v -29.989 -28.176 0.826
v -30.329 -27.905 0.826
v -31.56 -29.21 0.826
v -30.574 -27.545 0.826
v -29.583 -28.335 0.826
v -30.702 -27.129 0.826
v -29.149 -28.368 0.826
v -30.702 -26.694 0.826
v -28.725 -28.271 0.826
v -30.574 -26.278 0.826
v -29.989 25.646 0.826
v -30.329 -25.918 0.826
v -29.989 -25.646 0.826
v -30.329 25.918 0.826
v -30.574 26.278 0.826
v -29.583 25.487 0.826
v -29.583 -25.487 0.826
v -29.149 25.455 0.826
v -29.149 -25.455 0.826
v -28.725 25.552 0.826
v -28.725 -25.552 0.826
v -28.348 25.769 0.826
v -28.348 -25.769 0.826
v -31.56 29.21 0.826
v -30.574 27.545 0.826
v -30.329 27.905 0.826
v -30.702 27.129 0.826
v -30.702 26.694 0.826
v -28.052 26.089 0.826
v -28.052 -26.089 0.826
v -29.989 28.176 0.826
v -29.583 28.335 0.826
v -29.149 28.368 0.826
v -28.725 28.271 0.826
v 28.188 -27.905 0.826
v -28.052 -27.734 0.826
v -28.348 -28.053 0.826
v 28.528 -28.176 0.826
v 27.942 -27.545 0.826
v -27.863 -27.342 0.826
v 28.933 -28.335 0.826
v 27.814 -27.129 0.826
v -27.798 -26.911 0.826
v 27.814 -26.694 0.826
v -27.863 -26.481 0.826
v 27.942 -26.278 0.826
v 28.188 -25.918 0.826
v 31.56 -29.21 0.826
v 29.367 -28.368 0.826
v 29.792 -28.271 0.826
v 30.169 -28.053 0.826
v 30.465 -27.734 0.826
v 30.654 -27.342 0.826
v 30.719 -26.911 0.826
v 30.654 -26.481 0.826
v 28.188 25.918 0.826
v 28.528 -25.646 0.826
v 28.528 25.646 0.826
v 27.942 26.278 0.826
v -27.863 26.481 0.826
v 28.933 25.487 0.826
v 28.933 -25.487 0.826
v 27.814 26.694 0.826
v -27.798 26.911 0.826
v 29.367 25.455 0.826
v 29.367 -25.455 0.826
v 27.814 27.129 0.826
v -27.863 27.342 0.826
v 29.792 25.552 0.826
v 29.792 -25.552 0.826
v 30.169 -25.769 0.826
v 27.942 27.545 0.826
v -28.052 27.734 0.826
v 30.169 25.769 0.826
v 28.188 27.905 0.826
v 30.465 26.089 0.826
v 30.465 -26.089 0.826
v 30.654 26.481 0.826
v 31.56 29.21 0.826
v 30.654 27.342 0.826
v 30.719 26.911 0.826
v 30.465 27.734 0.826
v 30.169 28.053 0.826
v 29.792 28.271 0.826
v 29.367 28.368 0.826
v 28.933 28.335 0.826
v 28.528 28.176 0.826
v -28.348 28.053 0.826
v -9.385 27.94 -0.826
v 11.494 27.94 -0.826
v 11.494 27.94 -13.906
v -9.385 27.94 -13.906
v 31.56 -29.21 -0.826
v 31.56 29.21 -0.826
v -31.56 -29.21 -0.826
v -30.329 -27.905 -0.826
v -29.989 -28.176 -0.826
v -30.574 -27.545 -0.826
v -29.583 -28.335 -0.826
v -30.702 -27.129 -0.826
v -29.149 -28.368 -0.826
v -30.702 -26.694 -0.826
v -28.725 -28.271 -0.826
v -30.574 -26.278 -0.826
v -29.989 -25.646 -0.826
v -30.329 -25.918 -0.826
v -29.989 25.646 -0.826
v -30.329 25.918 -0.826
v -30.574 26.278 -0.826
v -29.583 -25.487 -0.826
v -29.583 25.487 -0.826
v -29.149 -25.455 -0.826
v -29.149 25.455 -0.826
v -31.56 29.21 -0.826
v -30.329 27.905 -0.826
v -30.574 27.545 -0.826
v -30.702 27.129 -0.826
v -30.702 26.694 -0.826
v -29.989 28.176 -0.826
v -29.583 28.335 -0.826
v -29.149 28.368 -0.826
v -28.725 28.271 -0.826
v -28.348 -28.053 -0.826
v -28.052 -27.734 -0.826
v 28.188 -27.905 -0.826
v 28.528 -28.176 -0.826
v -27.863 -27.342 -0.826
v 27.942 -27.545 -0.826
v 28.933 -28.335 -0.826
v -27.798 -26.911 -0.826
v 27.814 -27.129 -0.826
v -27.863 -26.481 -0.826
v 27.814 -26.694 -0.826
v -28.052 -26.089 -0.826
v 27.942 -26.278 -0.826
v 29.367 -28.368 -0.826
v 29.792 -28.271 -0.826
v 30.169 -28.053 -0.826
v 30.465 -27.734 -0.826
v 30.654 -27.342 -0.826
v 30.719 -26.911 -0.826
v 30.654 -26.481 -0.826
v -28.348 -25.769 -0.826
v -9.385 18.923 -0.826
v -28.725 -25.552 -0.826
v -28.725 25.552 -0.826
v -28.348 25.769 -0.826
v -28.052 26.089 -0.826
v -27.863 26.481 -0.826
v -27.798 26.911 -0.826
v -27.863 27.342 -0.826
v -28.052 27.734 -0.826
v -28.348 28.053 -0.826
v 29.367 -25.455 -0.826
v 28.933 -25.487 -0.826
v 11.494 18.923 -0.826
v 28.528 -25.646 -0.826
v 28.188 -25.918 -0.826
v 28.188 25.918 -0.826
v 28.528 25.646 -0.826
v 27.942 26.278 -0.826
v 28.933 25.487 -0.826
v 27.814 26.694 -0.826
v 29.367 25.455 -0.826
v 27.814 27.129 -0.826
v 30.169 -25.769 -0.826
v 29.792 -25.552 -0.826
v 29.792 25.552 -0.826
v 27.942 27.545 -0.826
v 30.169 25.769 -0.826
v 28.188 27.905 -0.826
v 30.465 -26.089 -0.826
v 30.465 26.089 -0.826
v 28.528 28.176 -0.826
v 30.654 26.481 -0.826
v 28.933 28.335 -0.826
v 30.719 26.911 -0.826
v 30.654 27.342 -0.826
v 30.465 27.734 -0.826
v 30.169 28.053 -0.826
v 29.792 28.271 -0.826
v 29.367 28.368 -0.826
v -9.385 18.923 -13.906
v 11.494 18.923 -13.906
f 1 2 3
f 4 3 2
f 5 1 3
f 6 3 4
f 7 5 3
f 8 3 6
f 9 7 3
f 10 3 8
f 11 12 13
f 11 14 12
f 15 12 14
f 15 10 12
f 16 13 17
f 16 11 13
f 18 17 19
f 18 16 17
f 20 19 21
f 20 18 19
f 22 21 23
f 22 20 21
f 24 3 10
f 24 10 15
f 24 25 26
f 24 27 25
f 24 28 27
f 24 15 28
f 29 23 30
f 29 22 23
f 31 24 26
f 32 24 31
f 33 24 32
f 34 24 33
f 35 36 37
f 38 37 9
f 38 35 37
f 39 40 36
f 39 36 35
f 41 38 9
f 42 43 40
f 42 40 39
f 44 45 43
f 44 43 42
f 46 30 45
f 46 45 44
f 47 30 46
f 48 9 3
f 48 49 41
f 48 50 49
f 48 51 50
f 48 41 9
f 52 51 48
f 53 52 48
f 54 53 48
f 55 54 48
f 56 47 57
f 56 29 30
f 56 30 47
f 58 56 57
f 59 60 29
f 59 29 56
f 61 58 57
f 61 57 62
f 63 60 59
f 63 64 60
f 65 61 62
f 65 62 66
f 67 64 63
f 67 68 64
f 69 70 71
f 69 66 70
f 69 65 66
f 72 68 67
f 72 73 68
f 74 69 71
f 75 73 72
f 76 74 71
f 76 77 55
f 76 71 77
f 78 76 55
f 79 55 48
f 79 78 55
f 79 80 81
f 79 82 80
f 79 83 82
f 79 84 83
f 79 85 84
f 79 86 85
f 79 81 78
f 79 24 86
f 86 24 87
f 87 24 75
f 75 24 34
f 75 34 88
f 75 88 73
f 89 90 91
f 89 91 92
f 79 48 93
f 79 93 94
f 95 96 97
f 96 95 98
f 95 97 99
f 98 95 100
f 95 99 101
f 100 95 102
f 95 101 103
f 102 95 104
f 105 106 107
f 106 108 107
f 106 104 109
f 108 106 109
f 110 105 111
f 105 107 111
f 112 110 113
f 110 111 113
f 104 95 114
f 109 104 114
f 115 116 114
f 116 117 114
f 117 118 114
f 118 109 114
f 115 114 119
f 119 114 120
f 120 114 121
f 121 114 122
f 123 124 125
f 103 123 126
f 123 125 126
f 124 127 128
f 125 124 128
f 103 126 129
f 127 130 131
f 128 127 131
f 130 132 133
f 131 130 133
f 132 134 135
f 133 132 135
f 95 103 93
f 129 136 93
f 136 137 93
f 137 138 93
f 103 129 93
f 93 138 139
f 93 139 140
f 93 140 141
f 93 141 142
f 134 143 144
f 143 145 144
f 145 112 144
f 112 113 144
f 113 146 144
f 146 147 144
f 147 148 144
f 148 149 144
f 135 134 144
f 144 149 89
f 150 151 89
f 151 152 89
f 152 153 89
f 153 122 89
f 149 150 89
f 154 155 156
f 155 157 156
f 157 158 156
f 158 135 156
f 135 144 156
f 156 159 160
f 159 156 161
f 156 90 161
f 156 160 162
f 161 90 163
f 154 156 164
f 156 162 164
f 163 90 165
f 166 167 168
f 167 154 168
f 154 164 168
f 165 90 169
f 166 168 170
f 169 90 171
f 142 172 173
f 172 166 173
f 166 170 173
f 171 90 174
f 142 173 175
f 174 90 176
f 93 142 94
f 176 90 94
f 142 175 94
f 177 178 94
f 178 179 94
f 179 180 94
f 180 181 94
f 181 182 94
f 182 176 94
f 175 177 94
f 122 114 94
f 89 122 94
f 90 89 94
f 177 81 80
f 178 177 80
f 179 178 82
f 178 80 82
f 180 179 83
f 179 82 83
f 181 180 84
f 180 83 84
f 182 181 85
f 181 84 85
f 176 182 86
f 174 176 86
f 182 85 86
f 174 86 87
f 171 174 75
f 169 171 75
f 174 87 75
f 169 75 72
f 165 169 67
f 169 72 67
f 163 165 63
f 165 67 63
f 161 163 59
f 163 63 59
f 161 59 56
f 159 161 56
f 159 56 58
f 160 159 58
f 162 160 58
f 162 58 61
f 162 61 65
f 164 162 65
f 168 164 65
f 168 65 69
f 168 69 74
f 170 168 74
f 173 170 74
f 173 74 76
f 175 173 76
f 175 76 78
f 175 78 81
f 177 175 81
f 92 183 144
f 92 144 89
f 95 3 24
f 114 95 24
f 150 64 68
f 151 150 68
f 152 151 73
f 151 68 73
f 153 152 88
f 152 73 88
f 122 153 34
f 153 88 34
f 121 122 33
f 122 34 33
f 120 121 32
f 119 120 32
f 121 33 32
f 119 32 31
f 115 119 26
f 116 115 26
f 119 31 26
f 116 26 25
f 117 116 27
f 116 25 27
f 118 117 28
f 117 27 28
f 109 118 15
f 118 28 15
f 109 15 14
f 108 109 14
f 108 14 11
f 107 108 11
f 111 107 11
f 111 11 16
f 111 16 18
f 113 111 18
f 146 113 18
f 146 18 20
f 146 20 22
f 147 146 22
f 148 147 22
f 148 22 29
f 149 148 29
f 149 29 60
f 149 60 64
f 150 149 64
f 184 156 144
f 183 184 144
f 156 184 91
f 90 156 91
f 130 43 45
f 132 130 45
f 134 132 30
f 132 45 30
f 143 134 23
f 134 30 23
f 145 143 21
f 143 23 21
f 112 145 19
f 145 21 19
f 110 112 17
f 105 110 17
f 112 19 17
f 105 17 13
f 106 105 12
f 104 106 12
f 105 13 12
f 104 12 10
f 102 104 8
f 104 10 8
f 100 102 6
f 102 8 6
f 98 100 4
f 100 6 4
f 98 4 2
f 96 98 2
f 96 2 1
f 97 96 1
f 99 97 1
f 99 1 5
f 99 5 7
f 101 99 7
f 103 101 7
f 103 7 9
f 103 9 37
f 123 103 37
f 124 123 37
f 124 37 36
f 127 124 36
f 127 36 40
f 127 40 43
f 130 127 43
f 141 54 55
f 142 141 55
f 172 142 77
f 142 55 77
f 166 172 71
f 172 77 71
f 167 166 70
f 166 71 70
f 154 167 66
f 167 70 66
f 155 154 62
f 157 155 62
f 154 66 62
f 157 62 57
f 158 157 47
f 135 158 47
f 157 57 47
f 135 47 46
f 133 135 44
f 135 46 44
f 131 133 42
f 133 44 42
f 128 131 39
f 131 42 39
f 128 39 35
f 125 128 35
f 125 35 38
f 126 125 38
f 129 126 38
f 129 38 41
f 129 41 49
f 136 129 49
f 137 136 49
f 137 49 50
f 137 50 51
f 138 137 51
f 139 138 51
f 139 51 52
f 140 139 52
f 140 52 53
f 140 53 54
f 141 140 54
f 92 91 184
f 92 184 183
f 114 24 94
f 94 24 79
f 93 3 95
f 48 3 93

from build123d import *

# Parameters (mm, degrees)
SKETCH1_W           = 63.119
SKETCH1_H           = 58.42
BOSS_EXTRUDE1_DEPTH = 0.8255
SKETCH6_W           = 20.8788
SKETCH6_H           = 9.017
BOSS_EXTRUDE3_DEPTH = 13.081
SKETCH3_R           = 1.4605
CUT_EXTRUDE1_DEPTH  = 15.732


with BuildPart() as part:
    # Sketch1 → Boss-Extrude1 (new body, symmetric)
    with BuildSketch(Plane.XY):
        Rectangle(SKETCH1_W, SKETCH1_H)
    extrude(amount=BOSS_EXTRUDE1_DEPTH, both=True)

    # Sketch6 → Boss-Extrude3 (add)
    with BuildSketch(Plane(origin=(0, 0, -0.8255), x_dir=(-1, 0, 0), z_dir=(0, 0, -1))):
        with Locations((-1.0541, 23.4315)):
            Rectangle(SKETCH6_W, SKETCH6_H)
    extrude(amount=BOSS_EXTRUDE3_DEPTH)

    # Sketch3 → Cut-Extrude1 (cut, through all)
    with BuildSketch(Plane.XY.offset(0.8255)):
        with Locations((-29.25826, 26.9113)):
            Circle(SKETCH3_R)
        with Locations((29.25826, 26.9113)):
            Circle(SKETCH3_R)
        with Locations((29.25826, -26.9113)):
            Circle(SKETCH3_R)
        with Locations((-29.25826, -26.9113)):
            Circle(SKETCH3_R)
    extrude(amount=-CUT_EXTRUDE1_DEPTH, mode=Mode.SUBTRACT)


solid = part.part
